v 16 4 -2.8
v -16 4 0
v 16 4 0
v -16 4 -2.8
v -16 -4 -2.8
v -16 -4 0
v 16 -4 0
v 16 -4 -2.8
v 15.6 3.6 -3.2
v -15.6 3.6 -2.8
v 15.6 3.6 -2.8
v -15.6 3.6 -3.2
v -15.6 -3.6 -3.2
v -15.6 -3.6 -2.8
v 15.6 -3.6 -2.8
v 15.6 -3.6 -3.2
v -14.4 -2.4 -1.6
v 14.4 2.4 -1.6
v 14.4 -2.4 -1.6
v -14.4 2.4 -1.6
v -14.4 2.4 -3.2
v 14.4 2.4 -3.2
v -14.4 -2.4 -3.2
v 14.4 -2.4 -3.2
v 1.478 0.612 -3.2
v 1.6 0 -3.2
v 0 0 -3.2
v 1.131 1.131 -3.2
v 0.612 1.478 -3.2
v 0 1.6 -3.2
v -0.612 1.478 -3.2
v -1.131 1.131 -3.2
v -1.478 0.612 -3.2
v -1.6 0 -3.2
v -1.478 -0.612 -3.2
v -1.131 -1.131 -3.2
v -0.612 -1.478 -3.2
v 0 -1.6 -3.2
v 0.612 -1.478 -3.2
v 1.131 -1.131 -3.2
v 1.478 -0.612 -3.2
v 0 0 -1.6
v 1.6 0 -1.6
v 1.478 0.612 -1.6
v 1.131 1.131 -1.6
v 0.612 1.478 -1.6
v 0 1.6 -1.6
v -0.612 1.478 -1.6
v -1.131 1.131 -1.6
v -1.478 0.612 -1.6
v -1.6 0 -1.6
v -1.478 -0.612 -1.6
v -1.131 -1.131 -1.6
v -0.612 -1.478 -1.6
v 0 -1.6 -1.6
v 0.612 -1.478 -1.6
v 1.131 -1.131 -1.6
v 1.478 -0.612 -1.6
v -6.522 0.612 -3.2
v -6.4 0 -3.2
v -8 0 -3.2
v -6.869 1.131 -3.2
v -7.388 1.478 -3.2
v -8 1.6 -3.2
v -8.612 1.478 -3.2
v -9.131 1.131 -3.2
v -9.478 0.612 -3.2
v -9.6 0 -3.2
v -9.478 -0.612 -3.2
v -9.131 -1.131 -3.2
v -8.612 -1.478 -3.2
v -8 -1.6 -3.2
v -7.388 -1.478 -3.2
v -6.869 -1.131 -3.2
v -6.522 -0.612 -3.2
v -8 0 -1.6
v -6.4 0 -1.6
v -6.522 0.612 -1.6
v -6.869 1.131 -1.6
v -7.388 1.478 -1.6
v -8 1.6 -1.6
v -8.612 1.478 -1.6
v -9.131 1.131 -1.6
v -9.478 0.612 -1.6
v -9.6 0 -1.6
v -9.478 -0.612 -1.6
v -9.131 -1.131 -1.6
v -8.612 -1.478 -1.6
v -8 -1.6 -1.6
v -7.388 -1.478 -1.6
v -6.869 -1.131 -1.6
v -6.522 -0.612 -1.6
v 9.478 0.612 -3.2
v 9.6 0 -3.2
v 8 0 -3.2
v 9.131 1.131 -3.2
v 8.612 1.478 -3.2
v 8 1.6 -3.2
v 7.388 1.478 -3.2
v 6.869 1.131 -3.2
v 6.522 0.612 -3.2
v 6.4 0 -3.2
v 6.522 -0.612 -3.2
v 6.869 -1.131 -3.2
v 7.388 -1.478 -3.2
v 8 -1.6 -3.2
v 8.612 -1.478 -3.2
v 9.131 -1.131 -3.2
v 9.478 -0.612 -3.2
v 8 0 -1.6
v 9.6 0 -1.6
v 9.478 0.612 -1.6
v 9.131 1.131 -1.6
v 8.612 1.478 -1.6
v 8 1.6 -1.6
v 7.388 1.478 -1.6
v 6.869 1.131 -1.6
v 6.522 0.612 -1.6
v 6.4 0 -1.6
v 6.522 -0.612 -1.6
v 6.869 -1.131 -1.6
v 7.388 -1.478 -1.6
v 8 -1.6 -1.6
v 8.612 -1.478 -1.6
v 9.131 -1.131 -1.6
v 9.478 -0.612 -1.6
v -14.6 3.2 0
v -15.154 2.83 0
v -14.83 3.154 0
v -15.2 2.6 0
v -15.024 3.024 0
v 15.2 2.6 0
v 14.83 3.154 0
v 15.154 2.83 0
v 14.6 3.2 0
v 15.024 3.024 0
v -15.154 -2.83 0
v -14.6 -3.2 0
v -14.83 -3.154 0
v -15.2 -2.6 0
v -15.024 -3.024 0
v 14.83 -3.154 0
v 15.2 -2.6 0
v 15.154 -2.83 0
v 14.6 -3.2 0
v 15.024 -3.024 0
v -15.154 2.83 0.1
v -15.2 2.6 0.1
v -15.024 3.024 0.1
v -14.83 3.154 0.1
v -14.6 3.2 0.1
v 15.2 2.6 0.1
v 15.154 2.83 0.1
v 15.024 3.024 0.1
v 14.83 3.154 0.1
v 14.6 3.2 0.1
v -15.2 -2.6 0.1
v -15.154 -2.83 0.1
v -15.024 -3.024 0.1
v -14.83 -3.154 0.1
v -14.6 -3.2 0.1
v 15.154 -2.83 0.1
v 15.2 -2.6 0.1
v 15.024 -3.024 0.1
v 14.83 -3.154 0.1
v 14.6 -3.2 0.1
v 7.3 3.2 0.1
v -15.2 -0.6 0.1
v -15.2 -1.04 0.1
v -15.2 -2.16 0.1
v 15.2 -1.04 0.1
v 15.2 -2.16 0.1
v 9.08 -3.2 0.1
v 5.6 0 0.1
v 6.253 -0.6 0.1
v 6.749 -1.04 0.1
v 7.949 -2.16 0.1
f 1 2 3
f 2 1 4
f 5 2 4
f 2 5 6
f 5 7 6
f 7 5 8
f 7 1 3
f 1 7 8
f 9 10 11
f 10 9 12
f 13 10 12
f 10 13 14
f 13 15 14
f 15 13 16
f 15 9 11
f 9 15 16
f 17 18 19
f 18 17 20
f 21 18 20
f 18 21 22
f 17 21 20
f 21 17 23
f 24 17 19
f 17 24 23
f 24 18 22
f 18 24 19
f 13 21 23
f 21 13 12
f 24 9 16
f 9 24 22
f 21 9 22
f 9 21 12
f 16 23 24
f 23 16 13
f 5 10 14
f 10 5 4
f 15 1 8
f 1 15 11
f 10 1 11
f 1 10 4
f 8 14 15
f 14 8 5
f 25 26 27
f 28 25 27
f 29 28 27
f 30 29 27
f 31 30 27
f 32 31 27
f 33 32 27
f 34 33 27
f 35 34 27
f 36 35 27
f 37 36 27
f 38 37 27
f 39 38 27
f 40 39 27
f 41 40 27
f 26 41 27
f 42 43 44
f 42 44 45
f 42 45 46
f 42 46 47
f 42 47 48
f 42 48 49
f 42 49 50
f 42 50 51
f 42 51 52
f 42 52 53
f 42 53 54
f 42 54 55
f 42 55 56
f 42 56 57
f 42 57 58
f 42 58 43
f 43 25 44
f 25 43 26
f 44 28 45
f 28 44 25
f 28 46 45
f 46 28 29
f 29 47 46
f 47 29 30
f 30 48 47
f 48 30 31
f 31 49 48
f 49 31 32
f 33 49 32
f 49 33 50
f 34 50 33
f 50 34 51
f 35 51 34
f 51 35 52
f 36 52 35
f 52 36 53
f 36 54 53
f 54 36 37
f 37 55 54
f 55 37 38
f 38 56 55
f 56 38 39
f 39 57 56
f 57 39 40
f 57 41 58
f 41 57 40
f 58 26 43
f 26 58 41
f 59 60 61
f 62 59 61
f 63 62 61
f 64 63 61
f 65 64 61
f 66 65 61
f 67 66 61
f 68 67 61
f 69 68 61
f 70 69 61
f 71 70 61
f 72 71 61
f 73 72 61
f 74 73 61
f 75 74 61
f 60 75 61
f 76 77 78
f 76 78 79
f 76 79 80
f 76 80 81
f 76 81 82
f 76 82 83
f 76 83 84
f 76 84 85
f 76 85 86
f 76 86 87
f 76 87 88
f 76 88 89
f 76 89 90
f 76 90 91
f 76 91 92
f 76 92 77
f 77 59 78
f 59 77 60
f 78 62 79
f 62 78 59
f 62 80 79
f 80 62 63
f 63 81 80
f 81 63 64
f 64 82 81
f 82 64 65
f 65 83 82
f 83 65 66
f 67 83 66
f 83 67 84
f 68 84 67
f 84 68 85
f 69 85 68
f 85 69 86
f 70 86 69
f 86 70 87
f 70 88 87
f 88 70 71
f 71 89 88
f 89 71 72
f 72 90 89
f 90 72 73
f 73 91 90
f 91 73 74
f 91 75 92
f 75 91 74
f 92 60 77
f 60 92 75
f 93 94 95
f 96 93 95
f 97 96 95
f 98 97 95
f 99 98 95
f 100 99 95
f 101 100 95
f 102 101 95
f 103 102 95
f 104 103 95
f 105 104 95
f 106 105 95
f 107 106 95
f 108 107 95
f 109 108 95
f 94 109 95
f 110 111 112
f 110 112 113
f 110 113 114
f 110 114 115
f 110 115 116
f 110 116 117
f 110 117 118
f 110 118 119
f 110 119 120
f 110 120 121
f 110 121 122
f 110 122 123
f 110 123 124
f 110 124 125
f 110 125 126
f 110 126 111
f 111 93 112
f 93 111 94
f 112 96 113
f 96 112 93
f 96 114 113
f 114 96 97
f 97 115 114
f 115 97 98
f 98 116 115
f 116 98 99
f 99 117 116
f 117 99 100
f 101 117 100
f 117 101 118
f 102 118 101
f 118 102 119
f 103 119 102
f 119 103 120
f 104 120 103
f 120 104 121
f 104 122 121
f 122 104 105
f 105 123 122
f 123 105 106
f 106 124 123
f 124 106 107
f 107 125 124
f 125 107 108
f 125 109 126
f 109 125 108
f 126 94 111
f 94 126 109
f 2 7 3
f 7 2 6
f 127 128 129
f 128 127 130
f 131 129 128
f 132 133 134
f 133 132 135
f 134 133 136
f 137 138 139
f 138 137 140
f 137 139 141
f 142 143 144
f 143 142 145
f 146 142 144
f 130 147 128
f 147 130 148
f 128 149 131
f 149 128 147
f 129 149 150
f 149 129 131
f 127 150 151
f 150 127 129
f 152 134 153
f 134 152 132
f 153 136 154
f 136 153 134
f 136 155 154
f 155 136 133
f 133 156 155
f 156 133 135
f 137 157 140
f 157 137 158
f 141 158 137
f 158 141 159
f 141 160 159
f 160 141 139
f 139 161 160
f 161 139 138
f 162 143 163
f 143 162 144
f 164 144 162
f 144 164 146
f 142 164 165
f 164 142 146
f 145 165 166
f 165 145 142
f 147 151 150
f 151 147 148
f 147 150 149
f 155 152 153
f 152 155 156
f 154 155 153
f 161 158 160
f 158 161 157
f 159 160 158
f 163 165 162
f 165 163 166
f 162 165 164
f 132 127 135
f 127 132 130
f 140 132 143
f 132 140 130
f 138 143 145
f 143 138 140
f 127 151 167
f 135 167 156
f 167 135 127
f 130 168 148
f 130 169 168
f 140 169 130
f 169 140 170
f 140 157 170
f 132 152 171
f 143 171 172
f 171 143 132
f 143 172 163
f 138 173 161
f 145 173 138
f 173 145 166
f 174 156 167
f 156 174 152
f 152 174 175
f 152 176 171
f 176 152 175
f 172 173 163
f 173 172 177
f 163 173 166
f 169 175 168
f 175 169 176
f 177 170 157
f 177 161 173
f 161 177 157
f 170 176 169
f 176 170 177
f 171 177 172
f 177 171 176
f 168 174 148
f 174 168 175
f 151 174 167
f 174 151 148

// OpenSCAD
// file: ../p/4-4edge.scad
use <../lib.scad>
function ldraw_lib__4_4edge() = [
// 0 Circle 1.0
// 0 Name: 4-4edge.dat
// 0 Author: James Jessiman
// 0 !LDRAW_ORG Primitive UPDATE 2017-01
// 0 !LICENSE Licensed under CC BY 2.0 and CC BY 4.0 : see CAreadme.txt
// 
// 0 BFC CERTIFY CCW
  [0,"BFC","CERTIFY"],
  [0,"BFC","CCW"],
// 
// 0 !HISTORY 1998-12-15 [PTadmin] Official Update 1998-10
// 0 !HISTORY 2005-12-28 [PTadmin] Official Update 2005-01
// 0 !HISTORY 2007-06-24 [PTadmin] Header formatted for Contributor Agreement
// 0 !HISTORY 2008-07-01 [PTadmin] Official Update 2008-01
// 0 !HISTORY 2017-01-15 [Steffen] BFCed
// 0 !HISTORY 2017-12-30 [PTadmin] Official Update 2017-01
// 
// 
// 2 24 1 0 0 0.9239 0 0.3827
  [2,24,1,0,0,0.9239,0,0.3827],
// 2 24 0.9239 0 0.3827 0.7071 0 0.7071
  [2,24,0.9239,0,0.3827,0.7071,0,0.7071],
// 2 24 0.7071 0 0.7071 0.3827 0 0.9239
  [2,24,0.7071,0,0.7071,0.3827,0,0.9239],
// 2 24 0.3827 0 0.9239 0 0 1
  [2,24,0.3827,0,0.9239,0,0,1],
// 2 24 0 0 1 -0.3827 0 0.9239
  [2,24,0,0,1,-0.3827,0,0.9239],
// 2 24 -0.3827 0 0.9239 -0.7071 0 0.7071
  [2,24,-0.3827,0,0.9239,-0.7071,0,0.7071],
// 2 24 -0.7071 0 0.7071 -0.9239 0 0.3827
  [2,24,-0.7071,0,0.7071,-0.9239,0,0.3827],
// 2 24 -0.9239 0 0.3827 -1 0 -0
  [2,24,-0.9239,0,0.3827,-1,0,-0],
// 2 24 -1 0 -0 -0.9239 0 -0.3827
  [2,24,-1,0,-0,-0.9239,0,-0.3827],
// 2 24 -0.9239 0 -0.3827 -0.7071 0 -0.7071
  [2,24,-0.9239,0,-0.3827,-0.7071,0,-0.7071],
// 2 24 -0.7071 0 -0.7071 -0.3827 0 -0.9239
  [2,24,-0.7071,0,-0.7071,-0.3827,0,-0.9239],
// 2 24 -0.3827 0 -0.9239 0 0 -1
  [2,24,-0.3827,0,-0.9239,0,0,-1],
// 2 24 0 0 -1 0.3827 0 -0.9239
  [2,24,0,0,-1,0.3827,0,-0.9239],
// 2 24 0.3827 0 -0.9239 0.7071 0 -0.7071
  [2,24,0.3827,0,-0.9239,0.7071,0,-0.7071],
// 2 24 0.7071 0 -0.7071 0.9239 0 -0.3827
  [2,24,0.7071,0,-0.7071,0.9239,0,-0.3827],
// 2 24 0.9239 0 -0.3827 1 0 0
  [2,24,0.9239,0,-0.3827,1,0,0],
];
module ldraw_lib__4_4edge(step=0, col=false, unit=2/5, alt=false, line=0.2, solid=!$preview)
    makepoly(ldraw_lib__4_4edge(), step=step, col=col, unit=unit, alt=alt, line=line, solid=solid);
ldraw_lib__4_4edge(line=0.2);
// file: ../p/4-4disc.scad
use <../lib.scad>
function ldraw_lib__4_4disc() = [
// 0 Disc 1.0
// 0 Name: 4-4disc.dat
// 0 Author: James Jessiman
// 0 !LDRAW_ORG Primitive UPDATE 2002-02
// 0 !LICENSE Licensed under CC BY 2.0 and CC BY 4.0 : see CAreadme.txt
// 
// 0 BFC CERTIFY CCW
  [0,"BFC","CERTIFY"],
  [0,"BFC","CCW"],
// 
// 0 !HISTORY 1998-12-15 [PTadmin] Official Update 1998-10
// 0 !HISTORY 2002-03-23 [sbliss] Added BFC statement
// 0 !HISTORY 2002-04-25 [PTadmin] Official Update 2002-02
// 0 !HISTORY 2007-06-24 [PTadmin] Header formatted for Contributor Agreement
// 0 !HISTORY 2008-07-01 [PTadmin] Official Update 2008-01
// 
// 
// 3 16 0 0 0 1 0 0 0.9239 0 0.3827
  [3,16,0,0,0,1,0,0,0.9239,0,0.3827],
// 3 16 0 0 0 0.9239 0 0.3827 0.7071 0 0.7071
  [3,16,0,0,0,0.9239,0,0.3827,0.7071,0,0.7071],
// 3 16 0 0 0 0.7071 0 0.7071 0.3827 0 0.9239
  [3,16,0,0,0,0.7071,0,0.7071,0.3827,0,0.9239],
// 3 16 0 0 0 0.3827 0 0.9239 0 0 1
  [3,16,0,0,0,0.3827,0,0.9239,0,0,1],
// 3 16 0 0 0 0 0 1 -0.3827 0 0.9239
  [3,16,0,0,0,0,0,1,-0.3827,0,0.9239],
// 3 16 0 0 0 -0.3827 0 0.9239 -0.7071 0 0.7071
  [3,16,0,0,0,-0.3827,0,0.9239,-0.7071,0,0.7071],
// 3 16 0 0 0 -0.7071 0 0.7071 -0.9239 0 0.3827
  [3,16,0,0,0,-0.7071,0,0.7071,-0.9239,0,0.3827],
// 3 16 0 0 0 -0.9239 0 0.3827 -1 0 -0
  [3,16,0,0,0,-0.9239,0,0.3827,-1,0,-0],
// 3 16 0 0 0 -1 0 -0 -0.9239 0 -0.3827
  [3,16,0,0,0,-1,0,-0,-0.9239,0,-0.3827],
// 3 16 0 0 0 -0.9239 0 -0.3827 -0.7071 0 -0.7071
  [3,16,0,0,0,-0.9239,0,-0.3827,-0.7071,0,-0.7071],
// 3 16 0 0 0 -0.7071 0 -0.7071 -0.3827 0 -0.9239
  [3,16,0,0,0,-0.7071,0,-0.7071,-0.3827,0,-0.9239],
// 3 16 0 0 0 -0.3827 0 -0.9239 0 0 -1
  [3,16,0,0,0,-0.3827,0,-0.9239,0,0,-1],
// 3 16 0 0 0 0 0 -1 0.3827 0 -0.9239
  [3,16,0,0,0,0,0,-1,0.3827,0,-0.9239],
// 3 16 0 0 0 0.3827 0 -0.9239 0.7071 0 -0.7071
  [3,16,0,0,0,0.3827,0,-0.9239,0.7071,0,-0.7071],
// 3 16 0 0 0 0.7071 0 -0.7071 0.9239 0 -0.3827
  [3,16,0,0,0,0.7071,0,-0.7071,0.9239,0,-0.3827],
// 3 16 0 0 0 0.9239 0 -0.3827 1 0 0
  [3,16,0,0,0,0.9239,0,-0.3827,1,0,0],
// 0
];
module ldraw_lib__4_4disc(step=0, col=false, unit=2/5, alt=false, line=0.2, solid=!$preview)
    makepoly(ldraw_lib__4_4disc(), step=step, col=col, unit=unit, alt=alt, line=line, solid=solid);
ldraw_lib__4_4disc(line=0.2);
// file: ../p/4-4cyli.scad
use <../lib.scad>
$fa=1; $fs=0.2;
function ldraw_lib__4_4cyli(realsolid=false) = [
// 0 Cylinder 1.0
// 0 Name: 4-4cyli.dat
// 0 Author: James Jessiman
// 0 !LDRAW_ORG Primitive UPDATE 2005-01
// 0 !LICENSE Licensed under CC BY 2.0 and CC BY 4.0 : see CAreadme.txt
// 
// 0 BFC CERTIFY CCW
  [0,"BFC","CERTIFY"],
  [0,"BFC","CCW"],
// 
// 0 !HISTORY 1998-12-15 [PTadmin] Official Update 1998-10
// 0 !HISTORY 2002-03-23 [sbliss] Added BFC statement; merged headers from files in distributions LDraw 0.27 and Complete.
// 0 !HISTORY 2002-04-25 [PTadmin] Official Update 2002-02
// 0 !HISTORY 2004-12-14 [guyvivan] BFC CCW
// 0 !HISTORY 2005-12-28 [PTadmin] Official Update 2005-01
// 0 !HISTORY 2007-06-24 [PTadmin] Header formatted for Contributor Agreement
// 0 !HISTORY 2008-07-01 [PTadmin] Official Update 2008-01
// 
// 
// 4 16 1 1 0 0.9239 1 0.3827 0.9239 0 0.3827 1 0 0
  [4,16,1,1,0,0.9239,1,0.3827,0.9239,0,0.3827,1,0,0],
// 5 24 1 0 0 1 1 0 0.9239 0 0.3827 0.9239 0 -0.3827
  [5,24,1,0,0,1,1,0,0.9239,0,0.3827,0.9239,0,-0.3827],
// 4 16 0.9239 1 0.3827 0.7071 1 0.7071 0.7071 0 0.7071 0.9239 0 0.3827
  [4,16,0.9239,1,0.3827,0.7071,1,0.7071,0.7071,0,0.7071,0.9239,0,0.3827],
// 5 24 0.9239 0 0.3827 0.9239 1 0.3827 0.7071 0 0.7071 1 0 0
  [5,24,0.9239,0,0.3827,0.9239,1,0.3827,0.7071,0,0.7071,1,0,0],
// 4 16 0.7071 1 0.7071 0.3827 1 0.9239 0.3827 0 0.9239 0.7071 0 0.7071
  [4,16,0.7071,1,0.7071,0.3827,1,0.9239,0.3827,0,0.9239,0.7071,0,0.7071],
// 5 24 0.7071 0 0.7071 0.7071 1 0.7071 0.3827 0 0.9239 0.9239 0 0.3827
  [5,24,0.7071,0,0.7071,0.7071,1,0.7071,0.3827,0,0.9239,0.9239,0,0.3827],
// 4 16 0.3827 1 0.9239 0 1 1 0 0 1 0.3827 0 0.9239
  [4,16,0.3827,1,0.9239,0,1,1,0,0,1,0.3827,0,0.9239],
// 5 24 0.3827 0 0.9239 0.3827 1 0.9239 0 0 1 0.7071 0 0.7071
  [5,24,0.3827,0,0.9239,0.3827,1,0.9239,0,0,1,0.7071,0,0.7071],
// 4 16 0 1 1 -0.3827 1 0.9239 -0.3827 0 0.9239 0 0 1
  [4,16,0,1,1,-0.3827,1,0.9239,-0.3827,0,0.9239,0,0,1],
// 5 24 0 0 1 0 1 1 -0.3827 0 0.9239 0.3827 0 0.9239
  [5,24,0,0,1,0,1,1,-0.3827,0,0.9239,0.3827,0,0.9239],
// 4 16 -0.3827 1 0.9239 -0.7071 1 0.7071 -0.7071 0 0.7071 -0.3827 0 0.9239
  [4,16,-0.3827,1,0.9239,-0.7071,1,0.7071,-0.7071,0,0.7071,-0.3827,0,0.9239],
// 5 24 -0.3827 0 0.9239 -0.3827 1 0.9239 -0.7071 0 0.7071 0 0 1
  [5,24,-0.3827,0,0.9239,-0.3827,1,0.9239,-0.7071,0,0.7071,0,0,1],
// 4 16 -0.7071 1 0.7071 -0.9239 1 0.3827 -0.9239 0 0.3827 -0.7071 0 0.7071
  [4,16,-0.7071,1,0.7071,-0.9239,1,0.3827,-0.9239,0,0.3827,-0.7071,0,0.7071],
// 5 24 -0.7071 0 0.7071 -0.7071 1 0.7071 -0.9239 0 0.3827 -0.3827 0 0.9239
  [5,24,-0.7071,0,0.7071,-0.7071,1,0.7071,-0.9239,0,0.3827,-0.3827,0,0.9239],
// 4 16 -0.9239 1 0.3827 -1 1 0 -1 0 0 -0.9239 0 0.3827
  [4,16,-0.9239,1,0.3827,-1,1,0,-1,0,0,-0.9239,0,0.3827],
// 5 24 -0.9239 0 0.3827 -0.9239 1 0.3827 -1 0 0 -0.7071 0 0.7071
  [5,24,-0.9239,0,0.3827,-0.9239,1,0.3827,-1,0,0,-0.7071,0,0.7071],
// 4 16 -1 1 0 -0.9239 1 -0.3827 -0.9239 0 -0.3827 -1 0 0
  [4,16,-1,1,0,-0.9239,1,-0.3827,-0.9239,0,-0.3827,-1,0,0],
// 5 24 -1 0 0 -1 1 0 -0.9239 0 -0.3827 -0.9239 0 0.3827
  [5,24,-1,0,0,-1,1,0,-0.9239,0,-0.3827,-0.9239,0,0.3827],
// 4 16 -0.9239 1 -0.3827 -0.7071 1 -0.7071 -0.7071 0 -0.7071 -0.9239 0 -0.3827
  [4,16,-0.9239,1,-0.3827,-0.7071,1,-0.7071,-0.7071,0,-0.7071,-0.9239,0,-0.3827],
// 5 24 -0.9239 0 -0.3827 -0.9239 1 -0.3827 -0.7071 0 -0.7071 -1 0 0
  [5,24,-0.9239,0,-0.3827,-0.9239,1,-0.3827,-0.7071,0,-0.7071,-1,0,0],
// 4 16 -0.7071 1 -0.7071 -0.3827 1 -0.9239 -0.3827 0 -0.9239 -0.7071 0 -0.7071
  [4,16,-0.7071,1,-0.7071,-0.3827,1,-0.9239,-0.3827,0,-0.9239,-0.7071,0,-0.7071],
// 5 24 -0.7071 0 -0.7071 -0.7071 1 -0.7071 -0.3827 0 -0.9239 -0.9239 0 -0.3827
  [5,24,-0.7071,0,-0.7071,-0.7071,1,-0.7071,-0.3827,0,-0.9239,-0.9239,0,-0.3827],
// 4 16 -0.3827 1 -0.9239 0 1 -1 0 0 -1 -0.3827 0 -0.9239
  [4,16,-0.3827,1,-0.9239,0,1,-1,0,0,-1,-0.3827,0,-0.9239],
// 5 24 -0.3827 0 -0.9239 -0.3827 1 -0.9239 0 0 -1 -0.7071 0 -0.7071
  [5,24,-0.3827,0,-0.9239,-0.3827,1,-0.9239,0,0,-1,-0.7071,0,-0.7071],
// 4 16 0 1 -1 0.3827 1 -0.9239 0.3827 0 -0.9239 0 0 -1
  [4,16,0,1,-1,0.3827,1,-0.9239,0.3827,0,-0.9239,0,0,-1],
// 5 24 0 0 -1 0 1 -1 0.3827 0 -0.9239 -0.3827 0 -0.9239
  [5,24,0,0,-1,0,1,-1,0.3827,0,-0.9239,-0.3827,0,-0.9239],
// 4 16 0.3827 1 -0.9239 0.7071 1 -0.7071 0.7071 0 -0.7071 0.3827 0 -0.9239
  [4,16,0.3827,1,-0.9239,0.7071,1,-0.7071,0.7071,0,-0.7071,0.3827,0,-0.9239],
// 5 24 0.3827 0 -0.9239 0.3827 1 -0.9239 0.7071 0 -0.7071 0 0 -1
  [5,24,0.3827,0,-0.9239,0.3827,1,-0.9239,0.7071,0,-0.7071,0,0,-1],
// 4 16 0.7071 1 -0.7071 0.9239 1 -0.3827 0.9239 0 -0.3827 0.7071 0 -0.7071
  [4,16,0.7071,1,-0.7071,0.9239,1,-0.3827,0.9239,0,-0.3827,0.7071,0,-0.7071],
// 5 24 0.7071 0 -0.7071 0.7071 1 -0.7071 0.9239 0 -0.3827 0.3827 0 -0.9239
  [5,24,0.7071,0,-0.7071,0.7071,1,-0.7071,0.9239,0,-0.3827,0.3827,0,-0.9239],
// 4 16 0.9239 1 -0.3827 1 1 0 1 0 0 0.9239 0 -0.3827
  [4,16,0.9239,1,-0.3827,1,1,0,1,0,0,0.9239,0,-0.3827],
// 5 24 0.9239 0 -0.3827 0.9239 1 -0.3827 1 0 0 0.7071 0 -0.7071
  [5,24,0.9239,0,-0.3827,0.9239,1,-0.3827,1,0,0,0.7071,0,-0.7071],
// 0
];
module ldraw_lib__4_4cyli(step=0, col=false, unit=2/5, alt=false, line=0.2, solid=!$preview)
    makepoly(ldraw_lib__4_4cyli(solid), step=step, col=col, unit=unit, alt=alt, line=line, solid=solid);
ldraw_lib__4_4cyli(line=0.2);
// file: ../p/stud3.scad
use <../lib.scad>
use <4-4cyli.scad>
use <4-4disc.scad>
use <4-4edge.scad>
function ldraw_lib__stud3() = [
// 0 Stud Tube Solid
// 0 Name: stud3.dat
// 0 Author: James Jessiman
// 0 !LDRAW_ORG Primitive UPDATE 2012-01
// 0 !LICENSE Licensed under CC BY 4.0 : see CAreadme.txt
// 
// 0 BFC CERTIFY CCW
  [0,"BFC","CERTIFY"],
  [0,"BFC","CCW"],
// 
// 0 !HISTORY 2002-04-04 [sbliss] Modified for BFC compliance
// 0 !HISTORY 2002-04-25 [PTadmin] Official Update 2002-02
// 0 !HISTORY 2007-06-24 [PTadmin] Header formatted for Contributor Agreement
// 0 !HISTORY 2008-07-01 [PTadmin] Official Update 2008-01
// 0 !HISTORY 2012-02-16 [Philo] Changed to CCW
// 0 !HISTORY 2012-03-30 [PTadmin] Official Update 2012-01
// 
// 
// 1 16 0 -4 0 4 0 0 0 1 0 0 0 4 4-4edge.dat
  [1,16,0,-4,0,4,0,0,0,1,0,0,0,4, ldraw_lib__4_4edge()],
// 1 16 0 0 0 4 0 0 0 1 0 0 0 4 4-4edge.dat
  [1,16,0,0,0,4,0,0,0,1,0,0,0,4, ldraw_lib__4_4edge()],
// 1 16 0 -4 0 4 0 0 0 1 0 0 0 4 4-4disc.dat
  [1,16,0,-4,0,4,0,0,0,1,0,0,0,4, ldraw_lib__4_4disc()],
  [-1,16,0,0,0,4,0,0,0,-1,0,0,0,4, ldraw_lib__4_4disc()],
// 1 16 0 -4 0 4 0 0 0 4 0 0 0 4 4-4cyli.dat
  [1,16,0,-4,0,4,0,0,0,4,0,0,0,4, ldraw_lib__4_4cyli()],
];
module ldraw_lib__stud3(step=0, col=false, unit=2/5, alt=false, line=0.2, solid=!$preview)
    makepoly(ldraw_lib__stud3(), step=step, col=col, unit=unit, alt=alt, line=line, solid=solid);
ldraw_lib__stud3(line=0.2);
// file: ../p/box5.scad
use <../lib.scad>
function ldraw_lib__box5() = [
// 0 Box with 5 Faces and All Edges
// 0 Name: box5.dat
// 0 Author: James Jessiman
// 0 !LDRAW_ORG Primitive UPDATE 2012-01
// 0 !LICENSE Licensed under CC BY 2.0 and CC BY 4.0 : see CAreadme.txt
// 
// 0 BFC CERTIFY CCW
  [0,"BFC","CERTIFY"],
  [0,"BFC","CCW"],
// 
// 0 !HISTORY 2002-04-03 [sbliss] Modified for BFC compliance
// 0 !HISTORY 2002-04-25 [PTadmin] Official Update 2002-02
// 0 !HISTORY 2007-06-24 [PTadmin] Header formatted for Contributor Agreement
// 0 !HISTORY 2008-07-01 [PTadmin] Official Update 2008-01
// 0 !HISTORY 2012-02-16 [Philo] Changed to CCW
// 0 !HISTORY 2012-03-30 [PTadmin] Official Update 2012-01
// 
// 
// 2 24 1 1 1 -1 1 1
  [2,24,1,1,1,-1,1,1],
// 2 24 -1 1 1 -1 1 -1
  [2,24,-1,1,1,-1,1,-1],
// 2 24 -1 1 -1 1 1 -1
  [2,24,-1,1,-1,1,1,-1],
// 2 24 1 1 -1 1 1 1
  [2,24,1,1,-1,1,1,1],
// 2 24 1 0 1 -1 0 1
  [2,24,1,0,1,-1,0,1],
// 2 24 -1 0 1 -1 0 -1
  [2,24,-1,0,1,-1,0,-1],
// 2 24 -1 0 -1 1 0 -1
  [2,24,-1,0,-1,1,0,-1],
// 2 24 1 0 -1 1 0 1
  [2,24,1,0,-1,1,0,1],
// 2 24 1 0 1 1 1 1
  [2,24,1,0,1,1,1,1],
// 2 24 -1 0 1 -1 1 1
  [2,24,-1,0,1,-1,1,1],
// 2 24 1 0 -1 1 1 -1
  [2,24,1,0,-1,1,1,-1],
// 2 24 -1 0 -1 -1 1 -1
  [2,24,-1,0,-1,-1,1,-1],
// 4 16 -1 1 1 1 1 1 1 1 -1 -1 1 -1
  [4,16,-1,1,1,1,1,1,1,1,-1,-1,1,-1],
// 4 16 -1 1 1 -1 0 1 1 0 1 1 1 1
  [4,16,-1,1,1,-1,0,1,1,0,1,1,1,1],
// 4 16 -1 1 -1 -1 0 -1 -1 0 1 -1 1 1
  [4,16,-1,1,-1,-1,0,-1,-1,0,1,-1,1,1],
// 4 16 1 1 -1 1 0 -1 -1 0 -1 -1 1 -1
  [4,16,1,1,-1,1,0,-1,-1,0,-1,-1,1,-1],
// 4 16 1 1 1 1 0 1 1 0 -1 1 1 -1
  [4,16,1,1,1,1,0,1,1,0,-1,1,1,-1],
];
makepoly(ldraw_lib__box5(), line=0.2);
// file: ../p/box4.scad
use <../lib.scad>
function ldraw_lib__box4() = [
// 0 Box with 4 Faces (2 Parallel Pairs) and All Edges
// 0 Name: box4.dat
// 0 Author: James Jessiman
// 0 !LDRAW_ORG Primitive UPDATE 2012-01
// 0 !LICENSE Licensed under CC BY 4.0 : see CAreadme.txt
// 
// 0 BFC CERTIFY CCW
  [0,"BFC","CERTIFY"],
  [0,"BFC","CCW"],
// 
// 0 !HISTORY 2002-04-03 [sbliss] Modified for BFC compliance
// 0 !HISTORY 2002-04-25 [PTadmin] Official Update 2002-02
// 0 !HISTORY 2007-06-24 [PTadmin] Header formatted for Contributor Agreement
// 0 !HISTORY 2008-07-01 [PTadmin] Official Update 2008-01
// 0 !HISTORY 2012-02-16 [Philo] Changed to CCW
// 0 !HISTORY 2012-03-30 [PTadmin] Official Update 2012-01
// 
// 
// 2 24 1 1 1 -1 1 1
  [2,24,1,1,1,-1,1,1],
// 2 24 -1 1 1 -1 1 -1
  [2,24,-1,1,1,-1,1,-1],
// 2 24 -1 1 -1 1 1 -1
  [2,24,-1,1,-1,1,1,-1],
// 2 24 1 1 -1 1 1 1
  [2,24,1,1,-1,1,1,1],
// 2 24 1 0 1 -1 0 1
  [2,24,1,0,1,-1,0,1],
// 2 24 -1 0 1 -1 0 -1
  [2,24,-1,0,1,-1,0,-1],
// 2 24 -1 0 -1 1 0 -1
  [2,24,-1,0,-1,1,0,-1],
// 2 24 1 0 -1 1 0 1
  [2,24,1,0,-1,1,0,1],
// 2 24 1 0 1 1 1 1
  [2,24,1,0,1,1,1,1],
// 2 24 -1 0 1 -1 1 1
  [2,24,-1,0,1,-1,1,1],
// 2 24 1 0 -1 1 1 -1
  [2,24,1,0,-1,1,1,-1],
// 2 24 -1 0 -1 -1 1 -1
  [2,24,-1,0,-1,-1,1,-1],
// 4 16 -1 1 1 -1 0 1 1 0 1 1 1 1
  [4,16,-1,1,1,-1,0,1,1,0,1,1,1,1],
// 4 16 -1 1 -1 -1 0 -1 -1 0 1 -1 1 1
  [4,16,-1,1,-1,-1,0,-1,-1,0,1,-1,1,1],
// 4 16 1 1 -1 1 0 -1 -1 0 -1 -1 1 -1
  [4,16,1,1,-1,1,0,-1,-1,0,-1,-1,1,-1],
// 4 16 1 1 1 1 0 1 1 0 -1 1 1 -1
  [4,16,1,1,1,1,0,1,1,0,-1,1,1,-1],
];
module ldraw_lib__box4(step=0, col=false, unit=2/5, alt=false, line=0.2, solid=!$preview)
    makepoly(ldraw_lib__box4(), step=step, col=col, unit=unit, alt=alt, line=line, solid=solid);
ldraw_lib__box4(line=0.2);
// file: ../p/1-4cyli.scad
use <../lib.scad>
function ldraw_lib__1_4cyli() = [
// 0 Cylinder 0.25
// 0 Name: 1-4cyli.dat
// 0 Author: James Jessiman
// 0 !LDRAW_ORG Primitive UPDATE 2012-01
// 0 !LICENSE Licensed under CC BY 2.0 and CC BY 4.0 : see CAreadme.txt
// 
// 0 BFC CERTIFY CCW
  [0,"BFC","CERTIFY"],
  [0,"BFC","CCW"],
// 
// 0 !HISTORY 2002-03-23 [sbliss] Added BFC statement.
// 0 !HISTORY 2002-04-25 [PTadmin] Official Update 2002-02
// 0 !HISTORY 2007-06-22 [PTadmin] Header formatted for Contributor Agreement
// 0 !HISTORY 2008-07-01 [PTadmin] Official Update 2008-01
// 0 !HISTORY 2012-02-16 [Philo] Changed to CCW
// 0 !HISTORY 2012-03-30 [PTadmin] Official Update 2012-01
// 
// 
// 4 16 1 1 0 0.9239 1 0.3827 0.9239 0 0.3827 1 0 0
  [4,16,1,1,0,0.9239,1,0.3827,0.9239,0,0.3827,1,0,0],
// 5 24 1 0 0 1 1 0 0.9239 0 0.3827 1 0 -1
  [5,24,1,0,0,1,1,0,0.9239,0,0.3827,1,0,-1],
// 4 16 0.9239 1 0.3827 0.7071 1 0.7071 0.7071 0 0.7071 0.9239 0 0.3827
  [4,16,0.9239,1,0.3827,0.7071,1,0.7071,0.7071,0,0.7071,0.9239,0,0.3827],
// 5 24 0.9239 0 0.3827 0.9239 1 0.3827 0.7071 0 0.7071 1 0 0
  [5,24,0.9239,0,0.3827,0.9239,1,0.3827,0.7071,0,0.7071,1,0,0],
// 4 16 0.7071 1 0.7071 0.3827 1 0.9239 0.3827 0 0.9239 0.7071 0 0.7071
  [4,16,0.7071,1,0.7071,0.3827,1,0.9239,0.3827,0,0.9239,0.7071,0,0.7071],
// 5 24 0.7071 0 0.7071 0.7071 1 0.7071 0.3827 0 0.9239 0.9239 0 0.3827
  [5,24,0.7071,0,0.7071,0.7071,1,0.7071,0.3827,0,0.9239,0.9239,0,0.3827],
// 4 16 0.3827 1 0.9239 0 1 1 0 0 1 0.3827 0 0.9239
  [4,16,0.3827,1,0.9239,0,1,1,0,0,1,0.3827,0,0.9239],
// 5 24 0.3827 0 0.9239 0.3827 1 0.9239 0 0 1 0.7071 0 0.7071
  [5,24,0.3827,0,0.9239,0.3827,1,0.9239,0,0,1,0.7071,0,0.7071],
// 5 24 0 0 1 0 1 1 0.3827 0 0.9239 -1 0 1
  [5,24,0,0,1,0,1,1,0.3827,0,0.9239,-1,0,1],
];
module ldraw_lib__1_4cyli(step=0, col=false, unit=2/5, alt=false, line=0.2, solid=!$preview)
    makepoly(ldraw_lib__1_4cyli(), step=step, col=col, unit=unit, alt=alt, line=line, solid=solid);
ldraw_lib__1_4cyli(line=0.2);
// file: ../p/1-4chrd.scad
use <../lib.scad>
$fa=1; $fs=0.2;
function ldraw_lib__1_4chrd(realsolid=false) = [
// 0 Chord 0.25
// 0 Name: 1-4chrd.dat
// 0 Author: Tony Hafner [hafhead]
// 0 !LDRAW_ORG Primitive UPDATE 2012-02
// 0 !LICENSE Licensed under CC BY 2.0 and CC BY 4.0 : see CAreadme.txt
// 
// 0 BFC CERTIFY CCW
  [0,"BFC","CERTIFY"],
  [0,"BFC","CCW"],
// 
// 0 !HISTORY 2004-04-22 [PTadmin] Official Update 2004-02
// 0 !HISTORY 2007-10-09 [PTadmin] Header formatted for Contributor Agreement
// 0 !HISTORY 2008-07-01 [PTadmin] Official Update 2008-01
// 0 !HISTORY 2012-08-02 [MMR1988] Re-creation with PrimGen2 and Rectifier
// 0 !HISTORY 2012-08-09 [PTadmin] Official Update 2012-02
// 
// 
// 4 16 0.9239 0 0.3827 0.3827 0 0.9239 0 0 1 1 0 0
  [4,16,0.9239,0,0.3827,0.3827,0,0.9239,0,0,1,1,0,0],
// 3 16 0.7071 0 0.7071 0.3827 0 0.9239 0.9239 0 0.3827
  [3,16,0.7071,0,0.7071,0.3827,0,0.9239,0.9239,0,0.3827],
];
module ldraw_lib__1_4chrd(step=0, col=false, unit=2/5, alt=false, line=0.2, solid=!$preview)
    makepoly(ldraw_lib__1_4chrd(solid), step=step, col=col, unit=unit, alt=alt, line=line, solid=solid);
ldraw_lib__1_4chrd(line=0.2);
// file: s/2431s01.scad
use <../../lib.scad>
use <../../p/box4.scad>
use <../../p/box5.scad>
use <../../p/stud3.scad>
function ldraw_lib__s__2431s01() = [
// 0 ~Tile  1 x  4 with Groove without Top Face
// 0 Name: s\2431s01.dat
// 0 Author: Santeri Piippo [arezey]
// 0 !LDRAW_ORG Subpart UPDATE 2010-02
// 0 !LICENSE Licensed under CC BY 2.0 and CC BY 4.0 : see CAreadme.txt
// 
// 0 BFC CERTIFY CCW
  [0,"BFC","CERTIFY"],
  [0,"BFC","CCW"],
// 
// 0 !HISTORY 2010-07-05 [PTadmin] Official Update 2010-02
// 
// 
// 1 16 0 0 0 40 0 0 0 7 0 0 0 10 box4.dat
  [1,16,0,0,0,40,0,0,0,7,0,0,0,10, ldraw_lib__box4()],
// 1 16 0 7 0 39 0 0 0 1 0 0 0 9 box4.dat
  [1,16,0,7,0,39,0,0,0,1,0,0,0,9, ldraw_lib__box4()],
// 0 BFC INVERTNEXT
  [0,"BFC","INVERTNEXT"],
// 1 16 0 8 0 36 0 0 0 -4 0 0 0 6 box5.dat
  [1,16,0,8,0,36,0,0,0,-4,0,0,0,6, ldraw_lib__box5()],
// 4 16 -39 8 9 -36 8 6 -36 8 -6 -39 8 -9
  [4,16,-39,8,9,-36,8,6,-36,8,-6,-39,8,-9],
// 4 16 39 8 -9 36 8 -6 36 8 6 39 8 9
  [4,16,39,8,-9,36,8,-6,36,8,6,39,8,9],
// 4 16 39 8 9 36 8 6 -36 8 6 -39 8 9
  [4,16,39,8,9,36,8,6,-36,8,6,-39,8,9],
// 4 16 -39 8 -9 -36 8 -6 36 8 -6 39 8 -9
  [4,16,-39,8,-9,-36,8,-6,36,8,-6,39,8,-9],
// 4 16 -40 7 10 -39 7 9 -39 7 -9 -40 7 -10
  [4,16,-40,7,10,-39,7,9,-39,7,-9,-40,7,-10],
// 4 16 40 7 -10 39 7 -9 39 7 9 40 7 10
  [4,16,40,7,-10,39,7,-9,39,7,9,40,7,10],
// 4 16 40 7 10 39 7 9 -39 7 9 -40 7 10
  [4,16,40,7,10,39,7,9,-39,7,9,-40,7,10],
// 4 16 -40 7 -10 -39 7 -9 39 7 -9 40 7 -10
  [4,16,-40,7,-10,-39,7,-9,39,7,-9,40,7,-10],
// 1 16 0 4 0 1 0 0 0 -1 0 0 0 1 stud3.dat
  [1,16,0,4,0,1,0,0,0,-1,0,0,0,1, ldraw_lib__stud3()],
// 1 16 -20 4 0 1 0 0 0 -1 0 0 0 1 stud3.dat
  [1,16,-20,4,0,1,0,0,0,-1,0,0,0,1, ldraw_lib__stud3()],
// 1 16 20 4 0 1 0 0 0 -1 0 0 0 1 stud3.dat
  [1,16,20,4,0,1,0,0,0,-1,0,0,0,1, ldraw_lib__stud3()],
// 0 //
];
makepoly(ldraw_lib__s__2431s01(), line=0.2);
// file: 6142275f.scad
use <../lib.scad>
use <../p/1-4chrd.scad>
use <../p/1-4cyli.scad>
function ldraw_lib__6142275f() = [
// 0 Sticker  0.8 x  3.8 with Red Line on Black, Grey and White Background Right
// 0 Name: 6142275f.dat
// 0 Author: Massimo Maso [Sirio]
// 0 !LDRAW_ORG Part UPDATE 2022-06
// 0 !LICENSE Licensed under CC BY 2.0 and CC BY 4.0 : see CAreadme.txt
// 
// 0 BFC CERTIFY CCW
  [0,"BFC","CERTIFY"],
  [0,"BFC","CCW"],
// 
// 0 !KEYWORDS Audi, e-tron, quattro, R18, Set 75872, Speed Champions
// 
// 0 !HISTORY 2022-12-20 [PTadmin] Official Update 2022-06
// 
// 
// 0 // Primitives
// 1 16 -36.5 0 6.5 -1.5 0 0 0 -1 0 0 0 1.5 1-4chrd.dat
  [1,16,-36.5,0,6.5,-1.5,0,0,0,-1,0,0,0,1.5, ldraw_lib__1_4chrd()],
// 1 16 36.5 0 6.5 1.5 0 0 0 -1 0 0 0 1.5 1-4chrd.dat
  [1,16,36.5,0,6.5,1.5,0,0,0,-1,0,0,0,1.5, ldraw_lib__1_4chrd()],
// 1 16 -36.5 0 -6.5 -1.5 0 0 0 -1 0 0 0 -1.5 1-4chrd.dat
  [1,16,-36.5,0,-6.5,-1.5,0,0,0,-1,0,0,0,-1.5, ldraw_lib__1_4chrd()],
// 1 16 36.5 0 -6.5 1.5 0 0 0 -1 0 0 0 -1.5 1-4chrd.dat
  [1,16,36.5,0,-6.5,1.5,0,0,0,-1,0,0,0,-1.5, ldraw_lib__1_4chrd()],
// 1 16 -36.5 0 6.5 -1.5 0 0 0 -.25 0 0 0 1.5 1-4cyli.dat
  [1,16,-36.5,0,6.5,-1.5,0,0,0,-.25,0,0,0,1.5, ldraw_lib__1_4cyli()],
// 1 16 36.5 0 6.5 1.5 0 0 0 -.25 0 0 0 1.5 1-4cyli.dat
  [1,16,36.5,0,6.5,1.5,0,0,0,-.25,0,0,0,1.5, ldraw_lib__1_4cyli()],
// 1 16 -36.5 0 -6.5 -1.5 0 0 0 -.25 0 0 0 -1.5 1-4cyli.dat
  [1,16,-36.5,0,-6.5,-1.5,0,0,0,-.25,0,0,0,-1.5, ldraw_lib__1_4cyli()],
// 1 16 36.5 0 -6.5 1.5 0 0 0 -.25 0 0 0 -1.5 1-4cyli.dat
  [1,16,36.5,0,-6.5,1.5,0,0,0,-.25,0,0,0,-1.5, ldraw_lib__1_4cyli()],
// 1 15 -36.5 -.25 6.5 -1.5 0 0 0 1 0 0 0 1.5 1-4chrd.dat
  [1,15,-36.5,-.25,6.5,-1.5,0,0,0,1,0,0,0,1.5, ldraw_lib__1_4chrd()],
// 1 0 36.5 -.25 6.5 1.5 0 0 0 1 0 0 0 1.5 1-4chrd.dat
  [1,0,36.5,-.25,6.5,1.5,0,0,0,1,0,0,0,1.5, ldraw_lib__1_4chrd()],
// 1 71 -36.5 -.25 -6.5 -1.5 0 0 0 1 0 0 0 -1.5 1-4chrd.dat
  [1,71,-36.5,-.25,-6.5,-1.5,0,0,0,1,0,0,0,-1.5, ldraw_lib__1_4chrd()],
// 1 0 36.5 -.25 -6.5 1.5 0 0 0 1 0 0 0 -1.5 1-4chrd.dat
  [1,0,36.5,-.25,-6.5,1.5,0,0,0,1,0,0,0,-1.5, ldraw_lib__1_4chrd()],
// 0 // Bottom faces
// 4 16 36.5 0 8 38 0 6.5 -38 0 6.5 -36.5 0 8
  [4,16,36.5,0,8,38,0,6.5,-38,0,6.5,-36.5,0,8],
// 4 16 38 0 6.5 38 0 -6.5 -38 0 -6.5 -38 0 6.5
  [4,16,38,0,6.5,38,0,-6.5,-38,0,-6.5,-38,0,6.5],
// 4 16 36.5 0 -8 -36.5 0 -8 -38 0 -6.5 38 0 -6.5
  [4,16,36.5,0,-8,-36.5,0,-8,-38,0,-6.5,38,0,-6.5],
// 0 // Lateral faces
// 3 16 -36.5 0 8 -36.5 -.25 8 18.25 -.25 8
  [3,16,-36.5,0,8,-36.5,-.25,8,18.25,-.25,8],
// 4 16 -36.5 0 8 18.25 -.25 8 36.5 -.25 8 36.5 0 8
  [4,16,-36.5,0,8,18.25,-.25,8,36.5,-.25,8,36.5,0,8],
// 3 16 -38 0 6.5 -38 -.25 -1.5 -38 -.25 6.5
  [3,16,-38,0,6.5,-38,-.25,-1.5,-38,-.25,6.5],
// 3 16 -38 0 6.5 -38 -.25 -2.6 -38 -.25 -1.5
  [3,16,-38,0,6.5,-38,-.25,-2.6,-38,-.25,-1.5],
// 4 16 -38 0 6.5 -38 0 -6.5 -38 -.25 -5.4 -38 -.25 -2.6
  [4,16,-38,0,6.5,-38,0,-6.5,-38,-.25,-5.4,-38,-.25,-2.6],
// 3 16 -38 0 -6.5 -38 -.25 -6.5 -38 -.25 -5.4
  [3,16,-38,0,-6.5,-38,-.25,-6.5,-38,-.25,-5.4],
// 3 16 38 0 6.5 38 -.25 6.5 38 -.25 -2.6
  [3,16,38,0,6.5,38,-.25,6.5,38,-.25,-2.6],
// 4 16 38 0 6.5 38 -.25 -2.6 38 -.25 -5.4 38 0 -6.5
  [4,16,38,0,6.5,38,-.25,-2.6,38,-.25,-5.4,38,0,-6.5],
// 3 16 38 0 -6.5 38 -.25 -5.4 38 -.25 -6.5
  [3,16,38,0,-6.5,38,-.25,-5.4,38,-.25,-6.5],
// 3 16 -36.5 0 -8 22.7 -.25 -8 -36.5 -.25 -8
  [3,16,-36.5,0,-8,22.7,-.25,-8,-36.5,-.25,-8],
// 4 16 -36.5 0 -8 36.5 0 -8 36.5 -.25 -8 22.7 -.25 -8
  [4,16,-36.5,0,-8,36.5,0,-8,36.5,-.25,-8,22.7,-.25,-8],
// 0 // Top faces
// 0 // Black faces
// 4 0 38 -.25 6.5 36.5 -.25 8 18.25 -.25 8 14 -.25 0
  [4,0,38,-.25,6.5,36.5,-.25,8,18.25,-.25,8,14,-.25,0],
// 3 0 38 -.25 6.5 14 -.25 0 15.6313 -.25 -1.5
  [3,0,38,-.25,6.5,14,-.25,0,15.6313,-.25,-1.5],
// 4 0 38 -.25 6.5 15.6313 -.25 -1.5 16.8725 -.25 -2.6 38 -.25 -2.6
  [4,0,38,-.25,6.5,15.6313,-.25,-1.5,16.8725,-.25,-2.6,38,-.25,-2.6],
// 4 0 38 -.25 -6.5 38 -.25 -5.4 19.8725 -.25 -5.4 22.7 -.25 -8
  [4,0,38,-.25,-6.5,38,-.25,-5.4,19.8725,-.25,-5.4,22.7,-.25,-8],
// 3 0 38 -.25 -6.5 22.7 -.25 -8 36.5 -.25 -8
  [3,0,38,-.25,-6.5,22.7,-.25,-8,36.5,-.25,-8],
// 0 // Grey faces
// 4 71 16.8725 -.25 -2.6 15.6313 -.25 -1.5 -38 -.25 -1.5 -38 -.25 -2.6
  [4,71,16.8725,-.25,-2.6,15.6313,-.25,-1.5,-38,-.25,-1.5,-38,-.25,-2.6],
// 3 71 19.8725 -.25 -5.4 -38 -.25 -5.4 -38 -.25 -6.5
  [3,71,19.8725,-.25,-5.4,-38,-.25,-5.4,-38,-.25,-6.5],
// 4 71 19.8725 -.25 -5.4 -38 -.25 -6.5 -36.5 -.25 -8 22.7 -.25 -8
  [4,71,19.8725,-.25,-5.4,-38,-.25,-6.5,-36.5,-.25,-8,22.7,-.25,-8],
// 0 // Red faces
// 4 4 -38 -.25 -2.6 -38 -.25 -5.4 19.8725 -.25 -5.4 16.8725 -.25 -2.6
  [4,4,-38,-.25,-2.6,-38,-.25,-5.4,19.8725,-.25,-5.4,16.8725,-.25,-2.6],
// 4 4 38 -.25 -2.6 16.8725 -.25 -2.6 19.8725 -.25 -5.4 38 -.25 -5.4
  [4,4,38,-.25,-2.6,16.8725,-.25,-2.6,19.8725,-.25,-5.4,38,-.25,-5.4],
// 0 // White faces
// 4 15 -38 -.25 6.5 -38 -.25 -1.5 15.6313 -.25 -1.5 14 -.25 0
  [4,15,-38,-.25,6.5,-38,-.25,-1.5,15.6313,-.25,-1.5,14,-.25,0],
// 4 15 -38 -.25 6.5 14 -.25 0 18.25 -.25 8 -36.5 -.25 8
  [4,15,-38,-.25,6.5,14,-.25,0,18.25,-.25,8,-36.5,-.25,8],
];
module ldraw_lib__6142275f(step=0, col=false, unit=2/5, alt=false, line=0.2, solid=!$preview)
    makepoly(ldraw_lib__6142275f(), step=step, col=col, unit=unit, alt=alt, line=line, solid=solid);
ldraw_lib__6142275f(line=0.2);
// file: 2431.scad
use <../lib.scad>
use <s/2431s01.scad>
function ldraw_lib__2431() = [
// 0 Tile  1 x  4 with Groove
// 0 Name: 2431.dat
// 0 Author: Santeri Piippo [arezey]
// 0 !LDRAW_ORG Part UPDATE 2010-02
// 0 !LICENSE Licensed under CC BY 2.0 and CC BY 4.0 : see CAreadme.txt
// 
// 0 BFC CERTIFY CCW
  [0,"BFC","CERTIFY"],
  [0,"BFC","CCW"],
// 
// 0 !HISTORY 2010-07-05 [PTadmin] Official Update 2010-02
// 
// 
// 1 16 0 0 0 1 0 0 0 1 0 0 0 1 s\2431s01.dat
  [1,16,0,0,0,1,0,0,0,1,0,0,0,1, ldraw_lib__s__2431s01()],
// 4 16 40 0 -10 40 0 10 -40 0 10 -40 0 -10
  [4,16,40,0,-10,40,0,10,-40,0,10,-40,0,-10],
// 0 //
];
makepoly(ldraw_lib__2431(), line=0.2);
// main file
use <../lib.scad>
use <2431.scad>
use <6142275f.scad>
function ldraw_lib__2431d0s() = [
// 0 Tile  1 x  4 with Red Line on Black, Grey and White Background Right Sticker
// 0 Name: 2431d0s.dat
// 0 Author: Vincent Messenet [Cheenzo]
// 0 !LDRAW_ORG Shortcut UPDATE 2026-05
// 0 !LICENSE Licensed under CC BY 4.0 : see CAreadme.txt
// 
// 0 BFC CERTIFY CCW
  [0,"BFC","CERTIFY"],
  [0,"BFC","CCW"],
// 
// 0 !CATEGORY Sticker Shortcut
// 
// 0 !KEYWORDS Bricklink 2431pb0807R, Set 75872
// 
// 0 !HISTORY 2026-05-31 [OrionP] Official Update 2026-05
// 
// 1 16 0 0 0 1 0 0 0 1 0 0 0 1 2431.dat
  [1,16,0,0,0,1,0,0,0,1,0,0,0,1, ldraw_lib__2431()],
// 1 16 0 0 0 1 0 0 0 1 0 0 0 1 6142275f.dat
  [1,16,0,0,0,1,0,0,0,1,0,0,0,1, ldraw_lib__6142275f()],
];
module ldraw_lib__2431d0s(step=0, col=false, unit=2/5, alt=false, line=0.2, solid=!$preview)
    makepoly(ldraw_lib__2431d0s(), step=step, col=col, unit=unit, alt=alt, line=line, solid=solid);
ldraw_lib__2431d0s(line=0.2);
